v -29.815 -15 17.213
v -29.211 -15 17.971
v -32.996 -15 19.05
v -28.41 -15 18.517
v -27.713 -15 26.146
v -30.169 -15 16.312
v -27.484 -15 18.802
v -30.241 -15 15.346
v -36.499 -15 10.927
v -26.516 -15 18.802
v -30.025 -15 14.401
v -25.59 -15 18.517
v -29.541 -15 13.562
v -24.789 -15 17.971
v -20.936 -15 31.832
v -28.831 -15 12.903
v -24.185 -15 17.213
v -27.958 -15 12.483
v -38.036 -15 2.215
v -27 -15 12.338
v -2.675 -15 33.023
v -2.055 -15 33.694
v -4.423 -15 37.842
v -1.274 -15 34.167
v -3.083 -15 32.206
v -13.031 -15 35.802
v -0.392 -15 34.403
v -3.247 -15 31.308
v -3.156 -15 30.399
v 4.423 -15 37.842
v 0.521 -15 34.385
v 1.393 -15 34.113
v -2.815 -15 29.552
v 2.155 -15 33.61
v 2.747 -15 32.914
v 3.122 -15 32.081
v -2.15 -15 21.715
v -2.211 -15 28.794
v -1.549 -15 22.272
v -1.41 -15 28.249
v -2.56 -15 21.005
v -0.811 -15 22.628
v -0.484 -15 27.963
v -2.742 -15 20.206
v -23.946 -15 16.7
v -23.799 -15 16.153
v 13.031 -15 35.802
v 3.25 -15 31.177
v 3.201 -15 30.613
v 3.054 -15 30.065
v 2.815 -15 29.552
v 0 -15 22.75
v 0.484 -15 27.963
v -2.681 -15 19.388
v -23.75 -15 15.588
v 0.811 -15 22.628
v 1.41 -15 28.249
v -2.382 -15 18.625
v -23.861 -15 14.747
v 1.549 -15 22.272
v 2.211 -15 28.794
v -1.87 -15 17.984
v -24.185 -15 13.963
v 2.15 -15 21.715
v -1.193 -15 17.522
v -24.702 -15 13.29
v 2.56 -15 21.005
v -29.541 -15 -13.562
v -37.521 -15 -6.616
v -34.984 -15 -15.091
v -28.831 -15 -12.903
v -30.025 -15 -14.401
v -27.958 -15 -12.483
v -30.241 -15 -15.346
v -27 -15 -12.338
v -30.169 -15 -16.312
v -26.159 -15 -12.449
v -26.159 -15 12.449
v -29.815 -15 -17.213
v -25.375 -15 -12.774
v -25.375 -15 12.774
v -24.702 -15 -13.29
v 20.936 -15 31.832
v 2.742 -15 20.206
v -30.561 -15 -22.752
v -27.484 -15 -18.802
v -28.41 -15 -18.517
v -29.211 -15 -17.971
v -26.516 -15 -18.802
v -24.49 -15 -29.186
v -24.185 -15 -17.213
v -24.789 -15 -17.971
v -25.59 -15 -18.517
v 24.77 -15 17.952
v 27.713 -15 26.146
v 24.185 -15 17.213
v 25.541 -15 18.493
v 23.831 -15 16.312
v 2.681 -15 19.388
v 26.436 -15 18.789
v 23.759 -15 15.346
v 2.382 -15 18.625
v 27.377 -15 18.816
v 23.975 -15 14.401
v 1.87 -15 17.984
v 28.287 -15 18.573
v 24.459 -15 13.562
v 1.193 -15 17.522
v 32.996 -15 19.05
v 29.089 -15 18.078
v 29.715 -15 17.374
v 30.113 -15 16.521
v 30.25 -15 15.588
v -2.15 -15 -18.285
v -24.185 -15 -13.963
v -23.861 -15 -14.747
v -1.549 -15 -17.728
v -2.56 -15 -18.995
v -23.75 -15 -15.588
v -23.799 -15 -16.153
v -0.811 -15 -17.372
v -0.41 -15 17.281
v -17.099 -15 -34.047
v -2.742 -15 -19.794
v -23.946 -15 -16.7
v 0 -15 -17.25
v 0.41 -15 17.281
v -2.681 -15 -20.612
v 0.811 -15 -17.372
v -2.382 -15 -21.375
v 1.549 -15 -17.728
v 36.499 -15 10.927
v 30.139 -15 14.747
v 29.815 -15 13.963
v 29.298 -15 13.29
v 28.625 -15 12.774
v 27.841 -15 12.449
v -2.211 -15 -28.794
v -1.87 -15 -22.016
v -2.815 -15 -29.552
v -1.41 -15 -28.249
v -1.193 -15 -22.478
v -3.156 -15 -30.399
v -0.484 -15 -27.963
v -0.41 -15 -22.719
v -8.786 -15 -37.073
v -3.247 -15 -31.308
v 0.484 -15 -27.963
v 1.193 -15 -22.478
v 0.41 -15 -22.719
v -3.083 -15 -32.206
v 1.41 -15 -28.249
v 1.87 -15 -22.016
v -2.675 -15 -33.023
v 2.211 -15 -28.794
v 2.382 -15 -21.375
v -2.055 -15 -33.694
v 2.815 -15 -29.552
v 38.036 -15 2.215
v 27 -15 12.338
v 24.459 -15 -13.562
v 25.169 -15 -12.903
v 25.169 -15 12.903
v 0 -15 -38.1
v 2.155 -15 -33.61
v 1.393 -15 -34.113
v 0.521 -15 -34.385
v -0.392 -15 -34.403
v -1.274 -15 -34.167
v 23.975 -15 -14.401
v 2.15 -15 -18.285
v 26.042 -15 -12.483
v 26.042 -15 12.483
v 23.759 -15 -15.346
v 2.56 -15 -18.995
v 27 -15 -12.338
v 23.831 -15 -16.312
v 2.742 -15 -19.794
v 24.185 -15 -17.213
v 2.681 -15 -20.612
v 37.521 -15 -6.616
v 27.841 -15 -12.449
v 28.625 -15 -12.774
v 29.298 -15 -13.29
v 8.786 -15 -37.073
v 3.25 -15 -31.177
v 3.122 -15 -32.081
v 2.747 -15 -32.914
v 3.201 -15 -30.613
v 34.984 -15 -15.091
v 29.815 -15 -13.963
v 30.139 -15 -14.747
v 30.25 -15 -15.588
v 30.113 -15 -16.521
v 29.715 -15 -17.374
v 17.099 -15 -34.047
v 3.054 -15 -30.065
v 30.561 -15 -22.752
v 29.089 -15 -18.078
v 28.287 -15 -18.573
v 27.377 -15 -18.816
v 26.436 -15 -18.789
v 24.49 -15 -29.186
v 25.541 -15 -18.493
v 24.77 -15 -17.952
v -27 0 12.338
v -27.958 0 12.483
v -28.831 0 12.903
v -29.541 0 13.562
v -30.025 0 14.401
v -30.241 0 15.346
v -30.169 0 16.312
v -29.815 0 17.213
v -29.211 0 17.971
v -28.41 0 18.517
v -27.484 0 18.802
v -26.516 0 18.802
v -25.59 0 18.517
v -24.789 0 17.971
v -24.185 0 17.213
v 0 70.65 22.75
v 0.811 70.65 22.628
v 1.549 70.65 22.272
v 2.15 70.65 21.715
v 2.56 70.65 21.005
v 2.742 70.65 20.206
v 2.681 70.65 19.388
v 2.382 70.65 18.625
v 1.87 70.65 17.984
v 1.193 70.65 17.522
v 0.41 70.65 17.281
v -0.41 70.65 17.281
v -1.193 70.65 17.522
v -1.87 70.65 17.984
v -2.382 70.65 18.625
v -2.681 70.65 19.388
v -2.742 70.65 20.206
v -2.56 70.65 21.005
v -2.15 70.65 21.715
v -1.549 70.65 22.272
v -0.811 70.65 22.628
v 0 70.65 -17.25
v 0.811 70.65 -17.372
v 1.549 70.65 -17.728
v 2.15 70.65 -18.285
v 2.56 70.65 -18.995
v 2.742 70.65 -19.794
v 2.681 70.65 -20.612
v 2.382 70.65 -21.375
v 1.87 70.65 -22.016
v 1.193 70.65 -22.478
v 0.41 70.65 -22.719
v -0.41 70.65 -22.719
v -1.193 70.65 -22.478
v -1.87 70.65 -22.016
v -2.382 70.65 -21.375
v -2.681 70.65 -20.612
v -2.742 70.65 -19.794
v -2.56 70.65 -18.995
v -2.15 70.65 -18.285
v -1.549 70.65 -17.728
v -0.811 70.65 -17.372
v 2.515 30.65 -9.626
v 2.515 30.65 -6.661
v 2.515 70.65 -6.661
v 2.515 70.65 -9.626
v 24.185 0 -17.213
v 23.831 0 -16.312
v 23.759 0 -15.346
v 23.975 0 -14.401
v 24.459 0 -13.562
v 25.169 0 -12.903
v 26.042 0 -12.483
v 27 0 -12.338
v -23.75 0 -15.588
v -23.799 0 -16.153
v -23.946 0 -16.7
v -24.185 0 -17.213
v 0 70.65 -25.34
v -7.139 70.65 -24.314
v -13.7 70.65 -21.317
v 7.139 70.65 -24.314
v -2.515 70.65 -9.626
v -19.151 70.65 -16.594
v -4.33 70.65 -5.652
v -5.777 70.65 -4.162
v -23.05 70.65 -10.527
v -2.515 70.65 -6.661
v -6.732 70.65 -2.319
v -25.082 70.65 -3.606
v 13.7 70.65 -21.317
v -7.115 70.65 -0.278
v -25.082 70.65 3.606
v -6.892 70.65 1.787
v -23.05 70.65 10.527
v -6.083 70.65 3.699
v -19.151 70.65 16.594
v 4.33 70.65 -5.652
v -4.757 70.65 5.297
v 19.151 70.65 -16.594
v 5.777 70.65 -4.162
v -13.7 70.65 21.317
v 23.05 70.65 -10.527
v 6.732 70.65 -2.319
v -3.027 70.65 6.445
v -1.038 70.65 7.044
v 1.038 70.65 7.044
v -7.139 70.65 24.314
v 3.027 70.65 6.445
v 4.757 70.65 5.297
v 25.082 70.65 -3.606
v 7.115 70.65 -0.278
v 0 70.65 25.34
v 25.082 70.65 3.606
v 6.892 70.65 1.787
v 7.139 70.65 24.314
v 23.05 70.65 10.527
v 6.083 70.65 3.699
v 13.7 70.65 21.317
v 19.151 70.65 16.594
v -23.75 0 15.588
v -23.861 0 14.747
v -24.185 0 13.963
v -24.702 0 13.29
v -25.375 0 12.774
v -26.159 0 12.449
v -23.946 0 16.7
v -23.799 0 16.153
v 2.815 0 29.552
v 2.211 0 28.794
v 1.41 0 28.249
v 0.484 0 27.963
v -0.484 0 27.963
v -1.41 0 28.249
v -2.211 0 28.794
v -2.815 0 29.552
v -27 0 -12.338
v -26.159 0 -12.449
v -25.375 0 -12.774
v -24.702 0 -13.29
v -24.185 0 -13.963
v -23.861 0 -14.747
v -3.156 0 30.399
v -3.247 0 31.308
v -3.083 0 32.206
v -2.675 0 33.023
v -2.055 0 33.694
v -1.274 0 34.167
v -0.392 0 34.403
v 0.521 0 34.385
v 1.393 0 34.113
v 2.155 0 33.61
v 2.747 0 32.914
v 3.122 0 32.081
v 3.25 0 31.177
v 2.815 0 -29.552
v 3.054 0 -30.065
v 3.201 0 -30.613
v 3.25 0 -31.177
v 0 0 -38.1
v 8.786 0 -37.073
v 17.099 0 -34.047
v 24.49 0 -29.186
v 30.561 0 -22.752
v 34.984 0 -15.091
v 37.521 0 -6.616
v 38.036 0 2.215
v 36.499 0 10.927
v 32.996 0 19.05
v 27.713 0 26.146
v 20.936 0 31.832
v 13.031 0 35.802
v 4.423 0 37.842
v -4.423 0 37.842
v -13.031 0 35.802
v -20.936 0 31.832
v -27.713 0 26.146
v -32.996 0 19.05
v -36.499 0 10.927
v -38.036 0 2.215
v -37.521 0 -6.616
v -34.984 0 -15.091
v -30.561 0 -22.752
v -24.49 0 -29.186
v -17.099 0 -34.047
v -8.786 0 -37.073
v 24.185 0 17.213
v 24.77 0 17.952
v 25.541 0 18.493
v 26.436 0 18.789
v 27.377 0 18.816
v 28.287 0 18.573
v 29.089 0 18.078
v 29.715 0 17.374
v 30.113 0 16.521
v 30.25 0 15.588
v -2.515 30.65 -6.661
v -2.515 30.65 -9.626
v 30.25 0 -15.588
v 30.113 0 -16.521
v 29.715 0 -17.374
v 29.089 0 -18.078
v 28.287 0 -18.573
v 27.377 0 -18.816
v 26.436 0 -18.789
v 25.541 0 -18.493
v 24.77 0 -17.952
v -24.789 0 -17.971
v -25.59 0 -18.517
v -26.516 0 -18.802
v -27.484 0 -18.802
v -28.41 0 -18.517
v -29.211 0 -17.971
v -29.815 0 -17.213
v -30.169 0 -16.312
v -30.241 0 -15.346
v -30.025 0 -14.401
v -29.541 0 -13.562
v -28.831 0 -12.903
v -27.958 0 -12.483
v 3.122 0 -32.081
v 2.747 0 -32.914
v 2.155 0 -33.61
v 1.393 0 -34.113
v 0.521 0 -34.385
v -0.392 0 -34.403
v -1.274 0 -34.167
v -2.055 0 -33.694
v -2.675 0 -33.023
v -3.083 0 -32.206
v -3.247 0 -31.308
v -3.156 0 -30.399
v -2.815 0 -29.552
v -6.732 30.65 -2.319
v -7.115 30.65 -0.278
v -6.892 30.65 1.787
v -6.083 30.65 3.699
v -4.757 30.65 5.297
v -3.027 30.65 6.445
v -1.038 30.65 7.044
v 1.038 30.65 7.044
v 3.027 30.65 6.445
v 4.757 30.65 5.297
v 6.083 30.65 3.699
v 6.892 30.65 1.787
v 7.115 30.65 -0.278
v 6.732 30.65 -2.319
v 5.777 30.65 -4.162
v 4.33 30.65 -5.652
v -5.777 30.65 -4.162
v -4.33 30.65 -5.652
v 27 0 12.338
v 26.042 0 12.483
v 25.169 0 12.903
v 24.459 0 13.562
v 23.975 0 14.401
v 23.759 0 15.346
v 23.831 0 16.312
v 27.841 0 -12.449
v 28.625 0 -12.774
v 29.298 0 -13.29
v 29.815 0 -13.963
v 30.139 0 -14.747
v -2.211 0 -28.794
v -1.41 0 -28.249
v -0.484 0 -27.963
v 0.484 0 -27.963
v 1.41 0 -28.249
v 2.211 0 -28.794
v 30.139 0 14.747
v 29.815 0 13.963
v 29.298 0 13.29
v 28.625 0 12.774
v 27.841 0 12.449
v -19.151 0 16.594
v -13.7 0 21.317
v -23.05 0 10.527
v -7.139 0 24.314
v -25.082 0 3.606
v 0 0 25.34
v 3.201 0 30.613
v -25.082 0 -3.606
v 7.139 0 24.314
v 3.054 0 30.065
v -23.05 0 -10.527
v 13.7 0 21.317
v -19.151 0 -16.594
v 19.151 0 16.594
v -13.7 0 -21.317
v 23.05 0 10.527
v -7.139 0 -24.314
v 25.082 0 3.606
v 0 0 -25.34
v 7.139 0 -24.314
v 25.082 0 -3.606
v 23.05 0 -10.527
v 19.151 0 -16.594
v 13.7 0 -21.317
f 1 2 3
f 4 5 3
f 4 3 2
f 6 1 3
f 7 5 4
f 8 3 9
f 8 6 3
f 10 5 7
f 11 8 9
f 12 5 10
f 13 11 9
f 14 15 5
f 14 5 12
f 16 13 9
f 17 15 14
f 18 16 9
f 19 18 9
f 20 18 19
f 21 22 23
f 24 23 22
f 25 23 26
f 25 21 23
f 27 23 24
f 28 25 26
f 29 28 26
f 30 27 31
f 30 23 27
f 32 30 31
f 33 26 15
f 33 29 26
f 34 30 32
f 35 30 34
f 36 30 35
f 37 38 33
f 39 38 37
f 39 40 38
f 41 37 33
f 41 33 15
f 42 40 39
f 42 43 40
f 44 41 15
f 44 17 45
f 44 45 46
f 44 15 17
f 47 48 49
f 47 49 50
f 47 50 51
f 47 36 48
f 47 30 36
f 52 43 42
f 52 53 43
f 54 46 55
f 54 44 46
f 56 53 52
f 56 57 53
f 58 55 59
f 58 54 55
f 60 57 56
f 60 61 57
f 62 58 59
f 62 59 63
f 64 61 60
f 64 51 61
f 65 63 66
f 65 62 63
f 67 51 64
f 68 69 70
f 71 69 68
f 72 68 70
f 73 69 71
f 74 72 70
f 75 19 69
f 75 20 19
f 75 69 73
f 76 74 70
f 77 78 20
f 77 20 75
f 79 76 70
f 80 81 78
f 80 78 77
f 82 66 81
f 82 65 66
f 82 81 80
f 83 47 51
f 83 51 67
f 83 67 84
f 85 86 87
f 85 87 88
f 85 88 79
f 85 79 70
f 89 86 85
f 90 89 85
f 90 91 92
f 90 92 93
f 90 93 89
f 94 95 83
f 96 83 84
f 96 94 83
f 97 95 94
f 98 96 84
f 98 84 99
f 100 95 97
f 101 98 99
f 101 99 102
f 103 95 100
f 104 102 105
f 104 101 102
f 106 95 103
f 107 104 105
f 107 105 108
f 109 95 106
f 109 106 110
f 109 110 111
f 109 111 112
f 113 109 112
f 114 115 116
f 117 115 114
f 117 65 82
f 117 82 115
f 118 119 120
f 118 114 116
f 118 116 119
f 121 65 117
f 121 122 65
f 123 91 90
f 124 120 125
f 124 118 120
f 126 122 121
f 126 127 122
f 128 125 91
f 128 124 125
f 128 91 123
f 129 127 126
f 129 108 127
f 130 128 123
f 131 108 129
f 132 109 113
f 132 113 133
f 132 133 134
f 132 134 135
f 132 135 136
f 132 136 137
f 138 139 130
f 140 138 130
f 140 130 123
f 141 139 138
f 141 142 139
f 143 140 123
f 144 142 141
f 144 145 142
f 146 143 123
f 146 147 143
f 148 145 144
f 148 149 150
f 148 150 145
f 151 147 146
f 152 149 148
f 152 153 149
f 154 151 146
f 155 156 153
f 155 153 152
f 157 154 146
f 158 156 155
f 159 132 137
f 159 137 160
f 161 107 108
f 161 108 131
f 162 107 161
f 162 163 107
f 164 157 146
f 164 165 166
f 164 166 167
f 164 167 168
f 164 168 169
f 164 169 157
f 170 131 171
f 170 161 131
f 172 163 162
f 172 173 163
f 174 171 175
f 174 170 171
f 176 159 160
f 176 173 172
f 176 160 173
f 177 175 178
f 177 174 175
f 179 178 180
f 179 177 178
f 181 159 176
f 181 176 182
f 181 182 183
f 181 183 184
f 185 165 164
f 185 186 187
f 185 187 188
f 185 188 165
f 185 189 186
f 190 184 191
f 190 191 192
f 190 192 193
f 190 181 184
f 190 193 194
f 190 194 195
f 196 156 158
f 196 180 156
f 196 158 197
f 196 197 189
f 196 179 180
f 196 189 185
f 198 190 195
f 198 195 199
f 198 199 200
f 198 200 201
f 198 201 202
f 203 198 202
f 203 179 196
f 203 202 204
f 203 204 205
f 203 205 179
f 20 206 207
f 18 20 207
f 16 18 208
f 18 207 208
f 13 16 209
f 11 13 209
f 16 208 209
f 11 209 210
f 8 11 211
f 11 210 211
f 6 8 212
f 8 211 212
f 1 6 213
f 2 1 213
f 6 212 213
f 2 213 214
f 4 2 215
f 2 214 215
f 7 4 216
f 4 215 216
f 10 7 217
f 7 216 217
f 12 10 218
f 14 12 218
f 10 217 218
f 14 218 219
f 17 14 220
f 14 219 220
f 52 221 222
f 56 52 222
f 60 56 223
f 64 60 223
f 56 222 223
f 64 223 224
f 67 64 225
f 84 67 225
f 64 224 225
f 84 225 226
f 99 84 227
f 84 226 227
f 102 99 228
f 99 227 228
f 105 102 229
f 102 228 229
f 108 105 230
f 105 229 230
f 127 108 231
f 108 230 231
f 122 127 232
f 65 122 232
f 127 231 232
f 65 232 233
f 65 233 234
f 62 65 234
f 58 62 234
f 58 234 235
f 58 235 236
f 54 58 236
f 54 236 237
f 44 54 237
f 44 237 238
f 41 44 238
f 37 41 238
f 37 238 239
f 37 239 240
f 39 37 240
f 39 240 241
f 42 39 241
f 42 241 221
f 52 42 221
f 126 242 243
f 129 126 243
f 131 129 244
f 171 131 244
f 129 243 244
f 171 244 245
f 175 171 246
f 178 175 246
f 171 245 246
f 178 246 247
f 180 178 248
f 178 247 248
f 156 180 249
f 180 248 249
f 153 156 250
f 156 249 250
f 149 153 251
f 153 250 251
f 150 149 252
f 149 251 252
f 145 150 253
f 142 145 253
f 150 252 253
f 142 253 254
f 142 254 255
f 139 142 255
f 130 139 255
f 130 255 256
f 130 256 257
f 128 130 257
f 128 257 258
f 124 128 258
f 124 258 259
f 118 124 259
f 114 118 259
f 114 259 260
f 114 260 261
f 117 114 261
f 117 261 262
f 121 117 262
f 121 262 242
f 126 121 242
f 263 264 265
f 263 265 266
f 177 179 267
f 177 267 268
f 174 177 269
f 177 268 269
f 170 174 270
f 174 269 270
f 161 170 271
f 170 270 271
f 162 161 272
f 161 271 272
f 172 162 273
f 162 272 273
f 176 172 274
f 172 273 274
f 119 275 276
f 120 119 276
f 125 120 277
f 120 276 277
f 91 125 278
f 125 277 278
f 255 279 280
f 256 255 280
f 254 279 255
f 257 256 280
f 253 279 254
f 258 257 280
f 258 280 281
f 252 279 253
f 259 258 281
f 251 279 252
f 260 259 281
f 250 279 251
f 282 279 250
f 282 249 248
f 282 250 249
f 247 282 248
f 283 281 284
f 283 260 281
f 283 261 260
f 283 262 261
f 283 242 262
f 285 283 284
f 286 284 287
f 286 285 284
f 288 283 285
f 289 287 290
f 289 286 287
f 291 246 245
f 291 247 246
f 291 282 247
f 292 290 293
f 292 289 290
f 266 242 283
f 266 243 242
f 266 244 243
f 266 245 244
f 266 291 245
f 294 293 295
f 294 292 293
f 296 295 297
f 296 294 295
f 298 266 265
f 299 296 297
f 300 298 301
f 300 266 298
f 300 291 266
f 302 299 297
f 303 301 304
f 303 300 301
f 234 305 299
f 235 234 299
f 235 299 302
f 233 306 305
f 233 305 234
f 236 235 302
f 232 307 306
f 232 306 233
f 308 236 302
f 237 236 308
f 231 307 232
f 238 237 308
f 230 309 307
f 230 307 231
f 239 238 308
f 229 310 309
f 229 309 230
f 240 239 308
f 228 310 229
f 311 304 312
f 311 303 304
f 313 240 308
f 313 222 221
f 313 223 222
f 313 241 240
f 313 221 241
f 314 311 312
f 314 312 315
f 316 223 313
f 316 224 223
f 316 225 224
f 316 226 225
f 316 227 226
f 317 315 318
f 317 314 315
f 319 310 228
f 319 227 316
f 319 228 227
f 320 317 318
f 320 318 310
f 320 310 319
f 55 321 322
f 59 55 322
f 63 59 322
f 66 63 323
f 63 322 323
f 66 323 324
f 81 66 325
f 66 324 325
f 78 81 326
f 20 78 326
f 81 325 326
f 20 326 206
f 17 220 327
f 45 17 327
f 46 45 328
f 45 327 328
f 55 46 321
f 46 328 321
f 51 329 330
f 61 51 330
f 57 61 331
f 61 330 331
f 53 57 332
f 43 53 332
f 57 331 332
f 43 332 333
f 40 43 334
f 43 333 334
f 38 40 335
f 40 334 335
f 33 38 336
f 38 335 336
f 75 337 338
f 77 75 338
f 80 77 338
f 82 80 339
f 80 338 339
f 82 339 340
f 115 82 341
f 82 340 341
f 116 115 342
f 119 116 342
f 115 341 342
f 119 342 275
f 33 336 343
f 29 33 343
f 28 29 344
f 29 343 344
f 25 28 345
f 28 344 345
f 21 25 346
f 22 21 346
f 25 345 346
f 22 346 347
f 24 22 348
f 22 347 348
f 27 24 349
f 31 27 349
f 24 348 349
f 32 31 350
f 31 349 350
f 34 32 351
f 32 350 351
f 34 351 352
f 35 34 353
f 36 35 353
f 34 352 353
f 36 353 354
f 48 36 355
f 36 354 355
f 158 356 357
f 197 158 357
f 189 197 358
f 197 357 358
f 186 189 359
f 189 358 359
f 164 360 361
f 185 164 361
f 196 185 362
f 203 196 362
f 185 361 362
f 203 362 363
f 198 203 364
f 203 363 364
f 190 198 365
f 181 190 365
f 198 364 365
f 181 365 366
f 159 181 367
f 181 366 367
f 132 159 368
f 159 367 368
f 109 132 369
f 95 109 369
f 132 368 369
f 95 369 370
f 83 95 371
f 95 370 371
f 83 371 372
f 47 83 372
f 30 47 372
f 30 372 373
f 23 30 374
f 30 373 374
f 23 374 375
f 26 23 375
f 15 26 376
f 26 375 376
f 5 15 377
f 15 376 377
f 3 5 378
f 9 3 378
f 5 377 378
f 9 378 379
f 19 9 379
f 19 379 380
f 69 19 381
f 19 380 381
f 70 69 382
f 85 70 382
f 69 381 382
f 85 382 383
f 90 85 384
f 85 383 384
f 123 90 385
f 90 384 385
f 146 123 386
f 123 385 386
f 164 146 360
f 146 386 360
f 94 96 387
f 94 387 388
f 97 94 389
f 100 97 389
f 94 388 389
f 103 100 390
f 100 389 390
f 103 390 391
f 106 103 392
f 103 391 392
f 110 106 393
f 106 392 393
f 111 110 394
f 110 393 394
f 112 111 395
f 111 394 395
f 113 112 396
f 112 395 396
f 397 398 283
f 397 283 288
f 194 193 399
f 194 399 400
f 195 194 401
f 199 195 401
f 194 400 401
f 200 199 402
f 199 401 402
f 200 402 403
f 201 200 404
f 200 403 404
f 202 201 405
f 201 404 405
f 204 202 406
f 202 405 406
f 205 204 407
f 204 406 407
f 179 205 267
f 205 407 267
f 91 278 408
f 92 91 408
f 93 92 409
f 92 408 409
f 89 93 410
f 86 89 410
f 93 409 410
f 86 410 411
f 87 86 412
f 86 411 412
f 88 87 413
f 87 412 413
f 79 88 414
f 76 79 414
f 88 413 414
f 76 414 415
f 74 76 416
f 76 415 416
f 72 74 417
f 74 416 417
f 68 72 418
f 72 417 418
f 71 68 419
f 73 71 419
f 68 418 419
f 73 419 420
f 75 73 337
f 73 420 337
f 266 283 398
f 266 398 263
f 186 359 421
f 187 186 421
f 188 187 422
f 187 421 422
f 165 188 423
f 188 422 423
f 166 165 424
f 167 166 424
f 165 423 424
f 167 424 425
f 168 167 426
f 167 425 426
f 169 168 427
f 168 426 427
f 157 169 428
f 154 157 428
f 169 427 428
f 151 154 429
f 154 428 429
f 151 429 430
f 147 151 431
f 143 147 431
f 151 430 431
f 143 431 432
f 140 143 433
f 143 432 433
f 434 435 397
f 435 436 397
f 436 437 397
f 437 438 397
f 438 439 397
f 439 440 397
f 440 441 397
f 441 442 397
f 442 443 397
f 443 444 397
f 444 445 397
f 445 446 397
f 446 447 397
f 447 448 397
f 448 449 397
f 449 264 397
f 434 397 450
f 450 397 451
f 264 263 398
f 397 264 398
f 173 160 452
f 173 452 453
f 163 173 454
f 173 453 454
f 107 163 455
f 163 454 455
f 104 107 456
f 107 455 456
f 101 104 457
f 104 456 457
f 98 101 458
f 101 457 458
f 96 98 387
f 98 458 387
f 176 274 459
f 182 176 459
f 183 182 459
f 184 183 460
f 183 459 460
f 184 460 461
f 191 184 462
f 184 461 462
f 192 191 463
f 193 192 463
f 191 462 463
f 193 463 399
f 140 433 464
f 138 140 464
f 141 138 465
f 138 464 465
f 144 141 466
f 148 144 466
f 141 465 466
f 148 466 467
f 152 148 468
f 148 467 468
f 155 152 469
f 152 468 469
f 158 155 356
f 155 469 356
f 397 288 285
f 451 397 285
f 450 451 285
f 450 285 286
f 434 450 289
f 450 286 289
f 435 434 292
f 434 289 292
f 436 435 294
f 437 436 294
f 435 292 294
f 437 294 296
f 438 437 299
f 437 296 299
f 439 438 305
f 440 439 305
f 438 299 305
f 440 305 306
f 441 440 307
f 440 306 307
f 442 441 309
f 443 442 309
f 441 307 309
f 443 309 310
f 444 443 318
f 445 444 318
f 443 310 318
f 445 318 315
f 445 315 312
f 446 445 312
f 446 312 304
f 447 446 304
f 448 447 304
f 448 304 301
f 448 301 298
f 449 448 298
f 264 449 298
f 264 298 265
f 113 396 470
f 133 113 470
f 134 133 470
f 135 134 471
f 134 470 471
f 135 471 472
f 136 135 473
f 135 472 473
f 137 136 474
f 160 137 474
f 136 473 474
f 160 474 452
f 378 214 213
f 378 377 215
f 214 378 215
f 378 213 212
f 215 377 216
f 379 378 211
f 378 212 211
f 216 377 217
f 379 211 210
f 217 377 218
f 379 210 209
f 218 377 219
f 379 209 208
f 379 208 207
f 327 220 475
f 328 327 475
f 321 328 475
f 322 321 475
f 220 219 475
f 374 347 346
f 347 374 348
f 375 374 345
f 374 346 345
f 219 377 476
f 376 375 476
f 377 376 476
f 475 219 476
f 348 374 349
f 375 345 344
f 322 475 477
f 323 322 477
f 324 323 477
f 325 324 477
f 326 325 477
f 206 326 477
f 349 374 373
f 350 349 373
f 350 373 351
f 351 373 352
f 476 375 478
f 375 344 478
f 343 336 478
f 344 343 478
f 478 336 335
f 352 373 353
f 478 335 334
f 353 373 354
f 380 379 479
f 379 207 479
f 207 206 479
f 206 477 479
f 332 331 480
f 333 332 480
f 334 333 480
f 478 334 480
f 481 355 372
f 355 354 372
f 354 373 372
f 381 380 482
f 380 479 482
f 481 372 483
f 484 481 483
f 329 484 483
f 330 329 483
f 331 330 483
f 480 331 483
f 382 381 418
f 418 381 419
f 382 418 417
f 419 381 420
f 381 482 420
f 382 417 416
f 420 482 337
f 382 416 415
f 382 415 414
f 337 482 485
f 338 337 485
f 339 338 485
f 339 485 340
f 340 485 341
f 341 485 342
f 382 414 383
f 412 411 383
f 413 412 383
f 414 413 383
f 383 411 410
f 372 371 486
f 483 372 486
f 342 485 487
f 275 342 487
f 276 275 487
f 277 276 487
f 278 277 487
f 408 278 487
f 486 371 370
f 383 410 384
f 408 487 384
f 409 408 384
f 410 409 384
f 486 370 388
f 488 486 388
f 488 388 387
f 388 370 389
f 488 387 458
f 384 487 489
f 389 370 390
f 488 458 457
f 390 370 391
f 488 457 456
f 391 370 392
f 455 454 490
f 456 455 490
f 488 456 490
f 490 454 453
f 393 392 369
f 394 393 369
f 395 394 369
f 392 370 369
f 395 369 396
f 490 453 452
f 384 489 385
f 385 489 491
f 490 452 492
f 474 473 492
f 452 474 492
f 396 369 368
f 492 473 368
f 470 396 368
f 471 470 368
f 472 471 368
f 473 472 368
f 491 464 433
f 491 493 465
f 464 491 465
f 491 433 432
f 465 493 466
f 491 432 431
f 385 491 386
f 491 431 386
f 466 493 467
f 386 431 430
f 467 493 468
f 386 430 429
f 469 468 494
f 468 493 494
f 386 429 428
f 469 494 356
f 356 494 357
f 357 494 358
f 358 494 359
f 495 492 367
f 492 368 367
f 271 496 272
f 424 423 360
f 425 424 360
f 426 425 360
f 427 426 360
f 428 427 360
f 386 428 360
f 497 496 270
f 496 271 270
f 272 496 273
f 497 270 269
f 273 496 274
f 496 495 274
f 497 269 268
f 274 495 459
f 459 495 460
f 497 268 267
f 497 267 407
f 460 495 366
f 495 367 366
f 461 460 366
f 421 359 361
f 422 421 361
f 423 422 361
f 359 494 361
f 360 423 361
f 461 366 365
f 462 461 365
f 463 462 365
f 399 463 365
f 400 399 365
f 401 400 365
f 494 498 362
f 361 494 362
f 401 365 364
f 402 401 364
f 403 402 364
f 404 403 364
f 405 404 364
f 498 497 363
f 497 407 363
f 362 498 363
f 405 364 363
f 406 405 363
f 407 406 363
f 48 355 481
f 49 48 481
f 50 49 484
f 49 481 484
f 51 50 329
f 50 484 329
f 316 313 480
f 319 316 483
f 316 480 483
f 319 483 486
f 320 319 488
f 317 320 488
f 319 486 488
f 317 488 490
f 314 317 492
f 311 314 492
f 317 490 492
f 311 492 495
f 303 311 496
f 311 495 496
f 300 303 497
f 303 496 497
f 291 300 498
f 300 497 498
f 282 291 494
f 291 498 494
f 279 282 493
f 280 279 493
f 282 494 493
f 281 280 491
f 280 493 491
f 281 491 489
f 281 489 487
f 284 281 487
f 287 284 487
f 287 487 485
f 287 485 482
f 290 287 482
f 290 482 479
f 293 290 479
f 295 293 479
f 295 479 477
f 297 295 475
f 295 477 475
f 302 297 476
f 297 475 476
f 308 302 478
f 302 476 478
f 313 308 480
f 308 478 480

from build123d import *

# Parameters (mm, degrees)
SKETCH1_R           = 25.34
BOSS_EXTRUDE1_DEPTH = 8.5
SKETCH2_R           = 25.34
BOSS_EXTRUDE2_DEPTH = 57.15
SKETCH7_R           = 25.34
BOSS_EXTRUDE4_DEPTH = 15
CUT_EXTRUDE3_DEPTH  = 115
SKETCH6_R           = 38.1
BOSS_EXTRUDE3_DEPTH = 15
CUT_EXTRUDE4_DEPTH  = 20
SKETCH10_R          = 2.75
CUT_EXTRUDE6_DEPTH  = 129
BOSS_EXTRUDE5_START = -93
BOSS_EXTRUDE5_DEPTH = 93
CUT_EXTRUDE8_START  = -10
SKETCH12_R          = 25.34
CUT_EXTRUDE8_DEPTH  = 10
SKETCH13_R          = 7.12
CUT_EXTRUDE9_DEPTH  = 40


with BuildPart() as part:
    # Sketch1 → Boss-Extrude1 (new body)
    with BuildSketch(Plane(origin=(0, 0, 0), x_dir=(1, 0, 0), z_dir=(0, 1, 0))):
        with Locations(Location((0, 0, 0), (0, 0, 270))):
            Circle(SKETCH1_R)
    extrude(amount=BOSS_EXTRUDE1_DEPTH)

    # Sketch2 → Boss-Extrude2 (add)
    with BuildSketch(Plane(origin=(0, 8.5, 0), x_dir=(1, 0, 0), z_dir=(0, 1, 0))):
        with Locations(Location((0, 0, 0), (0, 0, 270))):
            Circle(SKETCH2_R)
    extrude(amount=BOSS_EXTRUDE2_DEPTH)

    # Sketch7 → Boss-Extrude4 (add)
    with BuildSketch(Plane(origin=(0, 65.65, 0), x_dir=(1, 0, 0), z_dir=(0, 1, 0))):
        with Locations(Location((0, 0, 0), (0, 0, 270))):
            Circle(SKETCH7_R)
    extrude(amount=BOSS_EXTRUDE4_DEPTH)

    # Sketch5 → Cut-Extrude3 (cut)
    with BuildSketch(Plane.XZ):
        with BuildLine():
            ThreePointArc((2.575, 6.777305881), (0, 7.25), (-2.575, 6.777305881))
            Line((-2.575, 6.777305881), (-2.575, 4))
            Line((-2.575, 4), (2.575, 4))
            Line((2.575, 4), (2.575, 6.777305881))
        make_face()
        with BuildLine():
            Line((-2.575, 4), (-2.575, 6.777305881))
            ThreePointArc((-2.575, 6.777305881), (-4.116658232, -5.96788279), (7.25, 0))
            ThreePointArc((7.25, 0), (5.96788279, 4.116658232), (2.575, 6.777305881))
            Line((2.575, 6.777305881), (2.575, 4))
            Line((2.575, 4), (-2.575, 4))
        make_face()
        with BuildLine():
            Line((2.575, 9.15), (-2.575, 9.15))
            Line((-2.575, 9.15), (-2.575, 6.777305881))
            ThreePointArc((-2.575, 6.777305881), (0, 7.25), (2.575, 6.777305881))
            Line((2.575, 6.777305881), (2.575, 9.15))
        make_face()
    extrude(amount=-CUT_EXTRUDE3_DEPTH, mode=Mode.SUBTRACT)

    # Sketch6 → Boss-Extrude3 (add)
    with BuildSketch(Plane.XZ):
        with Locations(Location((0, 0, 0), (0, 0, 270))):
            Circle(SKETCH6_R)
    extrude(amount=BOSS_EXTRUDE3_DEPTH)

    # Sketch9 → Cut-Extrude4 (cut)
    with BuildSketch(Plane(origin=(0, 0, 0), x_dir=(1, 0, 0), z_dir=(0, 1, 0))):
        with BuildLine():
            ThreePointArc((-23.75, 15.588457268), (-23.860741065, 16.429619165), (-24.185417438, 17.213457268))
            Line((-24.185417438, 17.213457268), (-27, 15.588457268))
            Line((-27, 15.588457268), (-27, 12.338457268))
            ThreePointArc((-27, 12.338457268), (-24.701902961, 13.290360229), (-23.75, 15.588457268))
        make_face()
        with BuildLine():
            Line((-27, 15.588457268), (-24.185417438, 17.213457268))
            ThreePointArc((-24.185417438, 17.213457268), (-29.814582562, 17.213457268), (-27, 12.338457268))
            Line((-27, 12.338457268), (-27, 15.588457268))
        make_face()
        with BuildLine():
            Line((2.814582562, 29.551914536), (0, 31.176914536))
            Line((0, 31.176914536), (-2.814582562, 29.551914536))
            ThreePointArc((-2.814582562, 29.551914536), (0, 27.926914536), (2.814582562, 29.551914536))
        make_face()
        with BuildLine():
            Line((-2.814582562, 29.551914536), (0, 31.176914536))
            Line((0, 31.176914536), (2.814582562, 29.551914536))
            ThreePointArc((2.814582562, 29.551914536), (3.139258935, 30.33575264), (3.25, 31.176914536))
            ThreePointArc((3.25, 31.176914536), (-0.841161897, 34.316173472), (-2.814582562, 29.551914536))
        make_face()
        with BuildLine():
            ThreePointArc((30.25, 15.588457268), (27.841161897, 18.727716204), (24.185417438, 17.213457268))
            Line((24.185417438, 17.213457268), (27, 15.588457268))
            Line((27, 15.588457268), (27, 12.338457268))
            ThreePointArc((27, 12.338457268), (29.298097039, 13.290360229), (30.25, 15.588457268))
        make_face()
        with BuildLine():
            Line((27, 15.588457268), (24.185417438, 17.213457268))
            ThreePointArc((24.185417438, 17.213457268), (24.185417438, 13.963457268), (27, 12.338457268))
            Line((27, 12.338457268), (27, 15.588457268))
        make_face()
        with BuildLine():
            ThreePointArc((30.25, -15.588457268), (29.298097039, -13.290360229), (27, -12.338457268))
            Line((27, -12.338457268), (27, -15.588457268))
            Line((27, -15.588457268), (24.185417438, -17.213457268))
            ThreePointArc((24.185417438, -17.213457268), (27.841161897, -18.727716204), (30.25, -15.588457268))
        make_face()
        with BuildLine():
            Line((27, -15.588457268), (27, -12.338457268))
            ThreePointArc((27, -12.338457268), (24.185417438, -13.963457268), (24.185417438, -17.213457268))
            Line((24.185417438, -17.213457268), (27, -15.588457268))
        make_face()
        with BuildLine():
            ThreePointArc((2.814582562, -29.551914536), (0, -27.926914536), (-2.814582562, -29.551914536))
            Line((-2.814582562, -29.551914536), (0, -31.176914536))
            Line((0, -31.176914536), (2.814582562, -29.551914536))
        make_face()
        with BuildLine():
            Line((0, -31.176914536), (-2.814582562, -29.551914536))
            ThreePointArc((-2.814582562, -29.551914536), (-0.841161897, -34.316173472), (3.25, -31.176914536))
            ThreePointArc((3.25, -31.176914536), (3.139258935, -30.33575264), (2.814582562, -29.551914536))
            Line((2.814582562, -29.551914536), (0, -31.176914536))
        make_face()
        with BuildLine():
            ThreePointArc((-23.75, -15.588457268), (-24.701902961, -13.290360229), (-27, -12.338457268))
            Line((-27, -12.338457268), (-27, -15.588457268))
            Line((-27, -15.588457268), (-24.185417438, -17.213457268))
            ThreePointArc((-24.185417438, -17.213457268), (-23.860741065, -16.429619165), (-23.75, -15.588457268))
        make_face()
        with BuildLine():
            Line((-27, -15.588457268), (-27, -12.338457268))
            ThreePointArc((-27, -12.338457268), (-29.814582562, -17.213457268), (-24.185417438, -17.213457268))
            Line((-24.185417438, -17.213457268), (-27, -15.588457268))
        make_face()
    extrude(amount=-CUT_EXTRUDE4_DEPTH, mode=Mode.SUBTRACT)

    # Sketch10 → Cut-Extrude6 (cut)
    with BuildSketch(Plane(origin=(0, 80.65, 0), x_dir=(1, 0, 0), z_dir=(0, 1, 0))):
        with Locations(Location((0, 20, 0), (0, 0, 270))):
            Circle(SKETCH10_R)
        with Locations(Location((0, -20, 0), (0, 0, 270))):
            Circle(SKETCH10_R)
    extrude(amount=-CUT_EXTRUDE6_DEPTH, mode=Mode.SUBTRACT)

    # Sketch11 → Boss-Extrude5 (add)
    with BuildSketch(Plane(origin=(0, 80.65, 0), x_dir=(1, 0, 0), z_dir=(0, 1, 0)).offset(BOSS_EXTRUDE5_START)):
        with BuildLine():
            Line((-2.575, -6.777305881), (-2.575, -9.15))
            Line((-2.575, -9.15), (0, -9.15))
            Line((0, -9.15), (2.575, -9.15))
            Line((2.575, -9.15), (2.575, -6.777305881))
            ThreePointArc((2.575, -6.777305881), (0, 7.25), (-2.575, -6.777305881))
        make_face()
    extrude(amount=BOSS_EXTRUDE5_DEPTH)

    # Sketch12 → Cut-Extrude8 (cut)
    with BuildSketch(Plane(origin=(0, 80.65, 0), x_dir=(1, 0, 0), z_dir=(0, 1, 0)).offset(CUT_EXTRUDE8_START)):
        with Locations(Location((0, 0, 0), (0, 0, 270))):
            Circle(SKETCH12_R)
    extrude(amount=CUT_EXTRUDE8_DEPTH, mode=Mode.SUBTRACT)

    # Sketch13 → Cut-Extrude9 (cut)
    with BuildSketch(Plane(origin=(0, 70.65, 0), x_dir=(1, 0, 0), z_dir=(0, 1, 0))):
        Polygon((2.51482759, 9.62638963), (2.51482759, 7.12), (0, 7.12), (-2.51482759, 7.12), (-2.51482759, 9.62638963), align=None)
        Circle(SKETCH13_R)
        with BuildLine():
            ThreePointArc((-2.51482759, 6.66108416), (-1.278178543, 7.004331489), (0, 7.12))
            Line((0, 7.12), (-2.51482759, 7.12))
            Line((-2.51482759, 7.12), (-2.51482759, 6.66108416))
        make_face()
        with BuildLine():
            Line((2.51482759, 7.12), (0, 7.12))
            ThreePointArc((0, 7.12), (1.278178543, 7.004331489), (2.51482759, 6.66108416))
            Line((2.51482759, 6.66108416), (2.51482759, 7.12))
        make_face()
    extrude(amount=-CUT_EXTRUDE9_DEPTH, mode=Mode.SUBTRACT)


solid = part.part
